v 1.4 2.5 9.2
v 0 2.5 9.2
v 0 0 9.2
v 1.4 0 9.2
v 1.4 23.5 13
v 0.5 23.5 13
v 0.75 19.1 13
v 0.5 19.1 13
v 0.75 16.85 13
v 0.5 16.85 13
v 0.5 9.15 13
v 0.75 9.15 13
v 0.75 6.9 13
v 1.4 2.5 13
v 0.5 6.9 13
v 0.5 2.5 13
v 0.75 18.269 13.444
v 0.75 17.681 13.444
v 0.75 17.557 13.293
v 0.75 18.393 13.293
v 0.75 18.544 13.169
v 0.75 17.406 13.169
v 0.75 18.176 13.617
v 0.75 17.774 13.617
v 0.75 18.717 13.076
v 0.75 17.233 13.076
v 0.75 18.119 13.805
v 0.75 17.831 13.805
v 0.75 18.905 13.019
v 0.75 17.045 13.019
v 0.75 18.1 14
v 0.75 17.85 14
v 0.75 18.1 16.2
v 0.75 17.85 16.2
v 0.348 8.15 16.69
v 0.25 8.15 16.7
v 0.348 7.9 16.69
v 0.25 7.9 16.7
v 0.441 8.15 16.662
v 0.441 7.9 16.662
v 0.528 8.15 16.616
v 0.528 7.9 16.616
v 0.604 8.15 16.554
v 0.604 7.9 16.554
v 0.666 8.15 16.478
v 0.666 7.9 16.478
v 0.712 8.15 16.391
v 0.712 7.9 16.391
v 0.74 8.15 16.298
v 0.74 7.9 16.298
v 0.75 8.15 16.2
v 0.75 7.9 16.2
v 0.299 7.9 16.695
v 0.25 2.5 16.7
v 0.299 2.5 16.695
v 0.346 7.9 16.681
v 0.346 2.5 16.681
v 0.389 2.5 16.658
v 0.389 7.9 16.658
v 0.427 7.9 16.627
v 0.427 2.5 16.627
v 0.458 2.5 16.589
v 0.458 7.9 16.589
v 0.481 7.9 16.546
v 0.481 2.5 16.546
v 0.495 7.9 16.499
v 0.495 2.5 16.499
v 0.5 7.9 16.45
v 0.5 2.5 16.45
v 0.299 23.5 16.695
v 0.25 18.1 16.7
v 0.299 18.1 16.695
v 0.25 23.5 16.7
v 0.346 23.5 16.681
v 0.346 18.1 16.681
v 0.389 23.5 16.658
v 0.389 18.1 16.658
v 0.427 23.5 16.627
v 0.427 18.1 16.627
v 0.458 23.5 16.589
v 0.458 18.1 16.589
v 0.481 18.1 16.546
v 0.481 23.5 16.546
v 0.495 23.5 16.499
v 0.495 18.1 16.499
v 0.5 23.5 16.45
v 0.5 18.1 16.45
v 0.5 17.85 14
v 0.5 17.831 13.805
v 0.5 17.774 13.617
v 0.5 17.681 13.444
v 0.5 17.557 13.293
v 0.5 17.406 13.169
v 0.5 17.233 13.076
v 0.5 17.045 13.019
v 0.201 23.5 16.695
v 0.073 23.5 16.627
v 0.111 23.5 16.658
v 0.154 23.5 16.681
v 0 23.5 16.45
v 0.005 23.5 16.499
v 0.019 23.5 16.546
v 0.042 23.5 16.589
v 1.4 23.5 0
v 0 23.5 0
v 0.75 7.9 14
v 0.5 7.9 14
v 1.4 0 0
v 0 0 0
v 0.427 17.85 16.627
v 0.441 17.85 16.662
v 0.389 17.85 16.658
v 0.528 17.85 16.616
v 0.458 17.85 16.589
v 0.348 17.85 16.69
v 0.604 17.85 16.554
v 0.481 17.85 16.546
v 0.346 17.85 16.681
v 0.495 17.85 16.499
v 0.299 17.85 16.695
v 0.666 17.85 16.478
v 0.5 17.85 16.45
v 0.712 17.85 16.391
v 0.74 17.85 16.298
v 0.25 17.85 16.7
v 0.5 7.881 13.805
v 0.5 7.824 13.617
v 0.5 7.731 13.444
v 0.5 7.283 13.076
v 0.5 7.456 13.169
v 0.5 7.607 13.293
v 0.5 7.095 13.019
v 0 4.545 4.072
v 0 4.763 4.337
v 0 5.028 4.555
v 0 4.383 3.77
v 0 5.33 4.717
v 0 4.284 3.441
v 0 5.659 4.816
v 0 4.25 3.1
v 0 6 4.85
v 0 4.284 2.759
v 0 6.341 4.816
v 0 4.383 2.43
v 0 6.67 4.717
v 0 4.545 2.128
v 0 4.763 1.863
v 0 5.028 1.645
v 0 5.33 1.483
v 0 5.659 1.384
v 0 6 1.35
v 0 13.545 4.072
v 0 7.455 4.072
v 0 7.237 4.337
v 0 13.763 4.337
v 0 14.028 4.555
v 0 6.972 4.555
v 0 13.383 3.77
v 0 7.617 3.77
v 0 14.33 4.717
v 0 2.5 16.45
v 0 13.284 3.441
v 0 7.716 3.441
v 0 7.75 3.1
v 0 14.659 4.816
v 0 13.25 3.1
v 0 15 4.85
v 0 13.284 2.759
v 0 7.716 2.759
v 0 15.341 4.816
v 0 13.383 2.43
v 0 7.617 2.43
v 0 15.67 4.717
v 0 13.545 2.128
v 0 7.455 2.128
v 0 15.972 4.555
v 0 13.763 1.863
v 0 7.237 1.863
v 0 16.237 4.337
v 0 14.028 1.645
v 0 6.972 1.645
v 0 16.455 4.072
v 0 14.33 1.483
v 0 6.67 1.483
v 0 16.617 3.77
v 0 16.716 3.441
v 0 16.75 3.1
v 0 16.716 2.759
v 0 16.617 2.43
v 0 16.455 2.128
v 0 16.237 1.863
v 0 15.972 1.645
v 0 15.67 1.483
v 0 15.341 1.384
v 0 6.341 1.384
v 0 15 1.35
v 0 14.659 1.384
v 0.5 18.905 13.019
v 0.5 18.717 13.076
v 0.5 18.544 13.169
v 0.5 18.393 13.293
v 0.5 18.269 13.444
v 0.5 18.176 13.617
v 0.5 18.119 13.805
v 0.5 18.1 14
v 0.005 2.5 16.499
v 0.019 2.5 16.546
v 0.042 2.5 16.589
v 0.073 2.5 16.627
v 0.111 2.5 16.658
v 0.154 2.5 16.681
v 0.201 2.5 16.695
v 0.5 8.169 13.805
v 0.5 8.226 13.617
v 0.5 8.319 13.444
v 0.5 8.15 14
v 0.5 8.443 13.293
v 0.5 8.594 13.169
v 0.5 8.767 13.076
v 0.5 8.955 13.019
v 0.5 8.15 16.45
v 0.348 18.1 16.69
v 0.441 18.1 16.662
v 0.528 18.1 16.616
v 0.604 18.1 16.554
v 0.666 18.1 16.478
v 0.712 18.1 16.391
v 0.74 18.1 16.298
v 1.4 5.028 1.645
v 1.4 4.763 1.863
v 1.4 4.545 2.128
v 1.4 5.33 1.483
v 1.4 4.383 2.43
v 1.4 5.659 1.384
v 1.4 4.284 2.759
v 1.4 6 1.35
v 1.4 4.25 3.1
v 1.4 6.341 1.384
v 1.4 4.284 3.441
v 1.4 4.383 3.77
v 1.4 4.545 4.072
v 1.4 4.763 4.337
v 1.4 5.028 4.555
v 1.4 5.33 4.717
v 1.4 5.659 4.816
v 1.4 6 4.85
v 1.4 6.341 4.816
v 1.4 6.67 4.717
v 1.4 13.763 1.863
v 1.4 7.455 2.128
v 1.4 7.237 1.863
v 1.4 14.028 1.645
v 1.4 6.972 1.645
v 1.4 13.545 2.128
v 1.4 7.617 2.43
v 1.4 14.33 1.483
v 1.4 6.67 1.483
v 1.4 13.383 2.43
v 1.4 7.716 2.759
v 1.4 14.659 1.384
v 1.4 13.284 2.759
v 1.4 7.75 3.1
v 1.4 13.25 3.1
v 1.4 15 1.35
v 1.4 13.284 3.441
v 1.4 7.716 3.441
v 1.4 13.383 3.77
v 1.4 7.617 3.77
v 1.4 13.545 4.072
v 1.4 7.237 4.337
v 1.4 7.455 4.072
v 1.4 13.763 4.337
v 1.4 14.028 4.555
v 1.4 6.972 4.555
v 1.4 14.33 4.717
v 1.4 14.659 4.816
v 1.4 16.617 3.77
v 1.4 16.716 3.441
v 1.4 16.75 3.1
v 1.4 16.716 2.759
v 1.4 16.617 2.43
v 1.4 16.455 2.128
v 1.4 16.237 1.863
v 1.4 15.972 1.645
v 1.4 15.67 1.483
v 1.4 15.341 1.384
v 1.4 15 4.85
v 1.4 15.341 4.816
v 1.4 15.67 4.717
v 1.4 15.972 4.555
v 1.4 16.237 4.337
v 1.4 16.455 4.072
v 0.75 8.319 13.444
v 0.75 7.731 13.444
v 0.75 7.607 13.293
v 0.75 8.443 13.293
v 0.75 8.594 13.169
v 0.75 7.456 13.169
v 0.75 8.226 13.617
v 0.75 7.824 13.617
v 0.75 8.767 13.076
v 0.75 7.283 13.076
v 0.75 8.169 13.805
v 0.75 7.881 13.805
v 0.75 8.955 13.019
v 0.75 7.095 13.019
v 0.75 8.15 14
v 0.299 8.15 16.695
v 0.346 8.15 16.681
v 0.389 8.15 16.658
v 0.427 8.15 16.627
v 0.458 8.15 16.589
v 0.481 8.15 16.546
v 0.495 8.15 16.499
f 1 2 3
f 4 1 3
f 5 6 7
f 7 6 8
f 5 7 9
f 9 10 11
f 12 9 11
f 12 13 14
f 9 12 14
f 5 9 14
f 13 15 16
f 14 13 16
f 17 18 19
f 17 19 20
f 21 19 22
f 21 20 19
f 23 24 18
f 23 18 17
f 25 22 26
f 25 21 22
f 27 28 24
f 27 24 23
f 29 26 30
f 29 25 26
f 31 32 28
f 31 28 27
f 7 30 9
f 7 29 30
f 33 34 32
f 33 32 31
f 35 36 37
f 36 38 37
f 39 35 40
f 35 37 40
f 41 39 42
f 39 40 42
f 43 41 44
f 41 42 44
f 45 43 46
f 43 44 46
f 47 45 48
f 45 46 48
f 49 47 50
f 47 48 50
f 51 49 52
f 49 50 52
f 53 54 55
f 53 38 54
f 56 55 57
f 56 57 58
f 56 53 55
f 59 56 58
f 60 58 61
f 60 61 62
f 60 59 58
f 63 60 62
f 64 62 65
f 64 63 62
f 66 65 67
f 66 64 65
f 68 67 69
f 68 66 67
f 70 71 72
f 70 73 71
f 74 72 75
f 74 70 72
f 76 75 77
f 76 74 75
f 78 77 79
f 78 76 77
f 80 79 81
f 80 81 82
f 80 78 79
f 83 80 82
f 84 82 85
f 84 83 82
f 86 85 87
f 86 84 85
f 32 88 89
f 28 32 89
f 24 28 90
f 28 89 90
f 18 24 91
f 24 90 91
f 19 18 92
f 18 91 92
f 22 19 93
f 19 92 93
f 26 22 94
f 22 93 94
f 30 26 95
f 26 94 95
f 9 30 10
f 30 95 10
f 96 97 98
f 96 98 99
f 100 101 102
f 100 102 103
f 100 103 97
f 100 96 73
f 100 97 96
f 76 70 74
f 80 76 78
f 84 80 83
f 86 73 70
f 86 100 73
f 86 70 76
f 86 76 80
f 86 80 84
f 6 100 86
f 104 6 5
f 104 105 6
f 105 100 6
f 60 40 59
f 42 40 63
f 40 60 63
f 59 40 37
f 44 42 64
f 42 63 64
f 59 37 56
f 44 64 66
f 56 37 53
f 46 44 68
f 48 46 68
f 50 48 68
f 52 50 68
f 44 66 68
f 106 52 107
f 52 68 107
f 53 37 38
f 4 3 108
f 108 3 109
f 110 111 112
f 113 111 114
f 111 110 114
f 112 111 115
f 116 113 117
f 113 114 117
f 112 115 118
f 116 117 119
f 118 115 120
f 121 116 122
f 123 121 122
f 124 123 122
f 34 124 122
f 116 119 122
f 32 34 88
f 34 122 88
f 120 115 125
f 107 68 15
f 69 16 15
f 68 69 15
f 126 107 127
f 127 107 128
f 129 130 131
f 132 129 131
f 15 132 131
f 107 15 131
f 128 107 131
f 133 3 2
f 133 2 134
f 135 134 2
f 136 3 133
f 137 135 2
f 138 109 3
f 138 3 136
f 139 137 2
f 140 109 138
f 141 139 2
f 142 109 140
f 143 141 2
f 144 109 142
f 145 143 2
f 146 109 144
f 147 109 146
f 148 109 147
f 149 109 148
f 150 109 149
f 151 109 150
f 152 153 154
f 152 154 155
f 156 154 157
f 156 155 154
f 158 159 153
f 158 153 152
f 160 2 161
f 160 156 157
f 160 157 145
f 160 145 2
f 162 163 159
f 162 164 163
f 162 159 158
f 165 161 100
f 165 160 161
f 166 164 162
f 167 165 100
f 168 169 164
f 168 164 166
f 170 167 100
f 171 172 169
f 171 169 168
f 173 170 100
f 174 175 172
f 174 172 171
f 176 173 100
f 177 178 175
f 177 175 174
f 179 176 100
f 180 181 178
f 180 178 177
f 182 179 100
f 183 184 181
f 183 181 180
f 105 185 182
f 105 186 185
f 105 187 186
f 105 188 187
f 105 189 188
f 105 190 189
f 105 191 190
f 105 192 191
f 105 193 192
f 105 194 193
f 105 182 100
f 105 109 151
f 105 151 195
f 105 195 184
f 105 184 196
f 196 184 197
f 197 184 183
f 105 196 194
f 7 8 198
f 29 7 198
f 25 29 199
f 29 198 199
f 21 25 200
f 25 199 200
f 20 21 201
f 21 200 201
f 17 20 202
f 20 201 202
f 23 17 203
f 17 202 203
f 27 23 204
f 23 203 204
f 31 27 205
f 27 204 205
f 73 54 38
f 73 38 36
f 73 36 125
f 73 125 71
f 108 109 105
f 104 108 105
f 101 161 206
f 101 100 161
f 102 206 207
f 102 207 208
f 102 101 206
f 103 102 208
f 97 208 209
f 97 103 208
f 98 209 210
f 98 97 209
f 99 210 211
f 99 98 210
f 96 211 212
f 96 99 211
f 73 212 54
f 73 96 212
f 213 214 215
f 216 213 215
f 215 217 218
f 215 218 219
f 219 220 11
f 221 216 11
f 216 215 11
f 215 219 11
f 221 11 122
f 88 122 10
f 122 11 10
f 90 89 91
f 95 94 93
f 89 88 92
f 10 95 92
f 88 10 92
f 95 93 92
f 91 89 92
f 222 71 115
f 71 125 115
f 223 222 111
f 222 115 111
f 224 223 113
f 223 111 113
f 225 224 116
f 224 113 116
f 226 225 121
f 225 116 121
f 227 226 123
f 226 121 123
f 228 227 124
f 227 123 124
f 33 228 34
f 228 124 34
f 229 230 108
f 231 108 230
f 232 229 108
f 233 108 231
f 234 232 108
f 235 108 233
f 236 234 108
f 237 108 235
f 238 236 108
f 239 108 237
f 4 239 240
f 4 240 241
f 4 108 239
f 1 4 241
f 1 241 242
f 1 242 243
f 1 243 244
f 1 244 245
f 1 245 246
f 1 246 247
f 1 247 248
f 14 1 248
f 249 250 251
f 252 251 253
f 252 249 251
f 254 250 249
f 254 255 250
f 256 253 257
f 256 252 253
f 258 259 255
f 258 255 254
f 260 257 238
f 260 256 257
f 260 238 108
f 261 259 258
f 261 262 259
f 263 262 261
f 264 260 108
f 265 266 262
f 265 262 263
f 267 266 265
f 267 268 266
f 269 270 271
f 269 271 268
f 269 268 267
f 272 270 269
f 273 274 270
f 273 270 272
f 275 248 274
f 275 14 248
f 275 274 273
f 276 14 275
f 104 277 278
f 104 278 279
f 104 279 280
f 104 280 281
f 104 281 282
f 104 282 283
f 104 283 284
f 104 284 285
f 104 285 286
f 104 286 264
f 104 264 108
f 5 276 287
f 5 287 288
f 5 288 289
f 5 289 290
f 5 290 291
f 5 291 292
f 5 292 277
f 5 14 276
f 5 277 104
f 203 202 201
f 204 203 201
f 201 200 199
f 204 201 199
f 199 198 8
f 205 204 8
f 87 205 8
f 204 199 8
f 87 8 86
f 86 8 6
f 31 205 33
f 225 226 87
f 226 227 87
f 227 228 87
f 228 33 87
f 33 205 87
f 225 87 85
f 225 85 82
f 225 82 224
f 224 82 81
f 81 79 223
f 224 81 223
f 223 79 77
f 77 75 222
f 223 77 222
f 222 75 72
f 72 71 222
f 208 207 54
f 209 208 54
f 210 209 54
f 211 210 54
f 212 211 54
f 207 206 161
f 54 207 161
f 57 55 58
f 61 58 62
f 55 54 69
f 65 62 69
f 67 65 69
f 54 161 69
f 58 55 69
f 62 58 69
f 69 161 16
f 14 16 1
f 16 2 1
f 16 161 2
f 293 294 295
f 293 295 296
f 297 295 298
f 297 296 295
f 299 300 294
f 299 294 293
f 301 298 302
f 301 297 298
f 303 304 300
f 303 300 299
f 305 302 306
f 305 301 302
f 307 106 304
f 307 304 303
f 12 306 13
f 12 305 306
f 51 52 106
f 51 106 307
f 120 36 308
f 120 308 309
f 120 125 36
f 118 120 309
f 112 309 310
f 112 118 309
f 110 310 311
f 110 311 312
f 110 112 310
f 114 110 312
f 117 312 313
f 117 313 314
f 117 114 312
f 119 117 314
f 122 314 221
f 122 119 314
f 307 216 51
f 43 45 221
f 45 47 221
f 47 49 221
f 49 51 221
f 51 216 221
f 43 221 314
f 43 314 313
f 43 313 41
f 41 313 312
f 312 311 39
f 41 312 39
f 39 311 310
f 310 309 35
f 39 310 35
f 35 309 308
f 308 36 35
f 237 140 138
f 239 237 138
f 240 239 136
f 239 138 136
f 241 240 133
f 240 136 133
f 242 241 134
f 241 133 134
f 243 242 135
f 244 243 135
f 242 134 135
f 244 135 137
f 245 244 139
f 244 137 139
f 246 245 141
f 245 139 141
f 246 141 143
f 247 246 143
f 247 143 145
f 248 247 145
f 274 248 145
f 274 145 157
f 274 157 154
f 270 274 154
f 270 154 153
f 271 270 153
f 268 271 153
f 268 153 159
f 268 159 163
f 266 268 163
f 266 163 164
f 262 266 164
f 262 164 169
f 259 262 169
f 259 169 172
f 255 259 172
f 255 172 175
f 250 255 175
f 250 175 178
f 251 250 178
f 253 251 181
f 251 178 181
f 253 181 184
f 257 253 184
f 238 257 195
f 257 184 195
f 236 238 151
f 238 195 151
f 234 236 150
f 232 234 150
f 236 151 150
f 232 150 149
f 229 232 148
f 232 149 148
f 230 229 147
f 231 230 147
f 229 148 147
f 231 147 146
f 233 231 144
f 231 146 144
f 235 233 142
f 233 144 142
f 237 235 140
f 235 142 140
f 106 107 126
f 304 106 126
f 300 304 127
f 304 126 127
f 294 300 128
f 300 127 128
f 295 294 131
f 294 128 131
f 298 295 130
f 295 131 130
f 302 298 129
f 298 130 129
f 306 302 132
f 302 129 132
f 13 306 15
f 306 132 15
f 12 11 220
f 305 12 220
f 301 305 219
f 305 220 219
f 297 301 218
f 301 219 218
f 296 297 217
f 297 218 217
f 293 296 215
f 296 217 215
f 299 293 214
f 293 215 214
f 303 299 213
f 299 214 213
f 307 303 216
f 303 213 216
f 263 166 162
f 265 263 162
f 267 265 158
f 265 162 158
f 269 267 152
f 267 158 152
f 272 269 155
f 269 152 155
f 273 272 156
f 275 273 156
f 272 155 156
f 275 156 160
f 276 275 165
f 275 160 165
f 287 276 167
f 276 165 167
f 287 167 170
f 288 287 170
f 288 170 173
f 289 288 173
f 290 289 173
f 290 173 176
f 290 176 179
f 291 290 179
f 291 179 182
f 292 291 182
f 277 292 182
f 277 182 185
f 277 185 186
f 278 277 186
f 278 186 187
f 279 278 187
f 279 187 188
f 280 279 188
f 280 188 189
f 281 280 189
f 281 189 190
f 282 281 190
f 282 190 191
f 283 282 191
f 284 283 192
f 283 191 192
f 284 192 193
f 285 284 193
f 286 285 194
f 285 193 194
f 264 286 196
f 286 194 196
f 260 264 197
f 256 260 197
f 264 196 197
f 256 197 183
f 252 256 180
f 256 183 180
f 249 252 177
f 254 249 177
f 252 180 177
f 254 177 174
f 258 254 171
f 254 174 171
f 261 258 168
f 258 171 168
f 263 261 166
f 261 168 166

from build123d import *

# Parameters (mm, degrees)
F1_DEPTH = 1.4
F2_W     = 0.5
F2_H     = 21
F3_DEPTH = 3.7
F5_D     = 3.5
F7_DEPTH = 0.25
F8_R     = 0.24999
F9_R     = 0.4999


# Not quite as in the source:
# - a fillet or chamfer is up to 0.001 mm smaller than in the source, because OpenCascade refuses the exact size


with BuildPart() as f1:
    # F0 (on Right) → F1 (new body)
    with BuildSketch(Plane.YZ):
        Polygon((0, 9.2), (0, 0), (23.5, 0), (23.5, 13), (2.5, 13), (2.5, 9.2), align=None)
    extrude(amount=F1_DEPTH)

    # F2 (on face) → F3 (join)
    with BuildSketch(Plane.XY.offset(13)):
        with Locations((0.25, 13)):
            Rectangle(F2_W, F2_H)
    extrude(amount=F3_DEPTH)

    # F5 (through all)
    with Locations(Plane.YZ.offset(1.4)):
        with Locations((6, 3.1), (15, 3.1)):
            Hole(F5_D / 2)

    # F6 (on face) → F7 (join)
    with BuildSketch(Plane.YZ.offset(0.5)):
        with BuildLine():
            Line((7.9, 16.7), (7.9, 14))
            ThreePointArc((7.9, 14), (7.6071067812, 13.2928932188), (6.9, 13))
            Line((6.9, 13), (7.9, 13))
            Line((7.9, 13), (8.15, 13))
            Line((8.15, 13), (9.15, 13))
            ThreePointArc((9.15, 13), (8.4428932188, 13.2928932188), (8.15, 14))
            Line((8.15, 14), (8.15, 16.7))
            Line((8.15, 16.7), (7.9, 16.7))
        make_face()
        with BuildLine():
            Line((18.1, 16.7), (17.85, 16.7))
            Line((17.85, 16.7), (17.85, 14))
            ThreePointArc((17.85, 14), (17.5571067812, 13.2928932188), (16.85, 13))
            Line((16.85, 13), (17.85, 13))
            Line((17.85, 13), (18.1, 13))
            Line((18.1, 13), (19.1, 13))
            ThreePointArc((19.1, 13), (18.3928932188, 13.2928932188), (18.1, 14))
            Line((18.1, 14), (18.1, 16.7))
        make_face()
    extrude(amount=F7_DEPTH)

    # F8 (radius 0.25 in the source; OpenCascade refuses exactly that, so slightly less here)
    f8_edges = [f1.edges().sort_by_distance(p)[0] for p in [
        (0, 13, 16.7),
        (0.5, 20.8, 16.7),
        (0.5, 13, 16.7),
        (0.5, 5.2, 16.7),
    ]]
    fillet(f8_edges, radius=F8_R)

    # F9 (radius 0.5 in the source; OpenCascade refuses exactly that, so slightly less here)
    f9_edges = [f1.edges().sort_by_distance(p)[0] for p in [
        (0.75, 8.025, 16.7),
        (0.75, 17.975, 16.7),
    ]]
    fillet(f9_edges, radius=F9_R)


solid = f1.part
